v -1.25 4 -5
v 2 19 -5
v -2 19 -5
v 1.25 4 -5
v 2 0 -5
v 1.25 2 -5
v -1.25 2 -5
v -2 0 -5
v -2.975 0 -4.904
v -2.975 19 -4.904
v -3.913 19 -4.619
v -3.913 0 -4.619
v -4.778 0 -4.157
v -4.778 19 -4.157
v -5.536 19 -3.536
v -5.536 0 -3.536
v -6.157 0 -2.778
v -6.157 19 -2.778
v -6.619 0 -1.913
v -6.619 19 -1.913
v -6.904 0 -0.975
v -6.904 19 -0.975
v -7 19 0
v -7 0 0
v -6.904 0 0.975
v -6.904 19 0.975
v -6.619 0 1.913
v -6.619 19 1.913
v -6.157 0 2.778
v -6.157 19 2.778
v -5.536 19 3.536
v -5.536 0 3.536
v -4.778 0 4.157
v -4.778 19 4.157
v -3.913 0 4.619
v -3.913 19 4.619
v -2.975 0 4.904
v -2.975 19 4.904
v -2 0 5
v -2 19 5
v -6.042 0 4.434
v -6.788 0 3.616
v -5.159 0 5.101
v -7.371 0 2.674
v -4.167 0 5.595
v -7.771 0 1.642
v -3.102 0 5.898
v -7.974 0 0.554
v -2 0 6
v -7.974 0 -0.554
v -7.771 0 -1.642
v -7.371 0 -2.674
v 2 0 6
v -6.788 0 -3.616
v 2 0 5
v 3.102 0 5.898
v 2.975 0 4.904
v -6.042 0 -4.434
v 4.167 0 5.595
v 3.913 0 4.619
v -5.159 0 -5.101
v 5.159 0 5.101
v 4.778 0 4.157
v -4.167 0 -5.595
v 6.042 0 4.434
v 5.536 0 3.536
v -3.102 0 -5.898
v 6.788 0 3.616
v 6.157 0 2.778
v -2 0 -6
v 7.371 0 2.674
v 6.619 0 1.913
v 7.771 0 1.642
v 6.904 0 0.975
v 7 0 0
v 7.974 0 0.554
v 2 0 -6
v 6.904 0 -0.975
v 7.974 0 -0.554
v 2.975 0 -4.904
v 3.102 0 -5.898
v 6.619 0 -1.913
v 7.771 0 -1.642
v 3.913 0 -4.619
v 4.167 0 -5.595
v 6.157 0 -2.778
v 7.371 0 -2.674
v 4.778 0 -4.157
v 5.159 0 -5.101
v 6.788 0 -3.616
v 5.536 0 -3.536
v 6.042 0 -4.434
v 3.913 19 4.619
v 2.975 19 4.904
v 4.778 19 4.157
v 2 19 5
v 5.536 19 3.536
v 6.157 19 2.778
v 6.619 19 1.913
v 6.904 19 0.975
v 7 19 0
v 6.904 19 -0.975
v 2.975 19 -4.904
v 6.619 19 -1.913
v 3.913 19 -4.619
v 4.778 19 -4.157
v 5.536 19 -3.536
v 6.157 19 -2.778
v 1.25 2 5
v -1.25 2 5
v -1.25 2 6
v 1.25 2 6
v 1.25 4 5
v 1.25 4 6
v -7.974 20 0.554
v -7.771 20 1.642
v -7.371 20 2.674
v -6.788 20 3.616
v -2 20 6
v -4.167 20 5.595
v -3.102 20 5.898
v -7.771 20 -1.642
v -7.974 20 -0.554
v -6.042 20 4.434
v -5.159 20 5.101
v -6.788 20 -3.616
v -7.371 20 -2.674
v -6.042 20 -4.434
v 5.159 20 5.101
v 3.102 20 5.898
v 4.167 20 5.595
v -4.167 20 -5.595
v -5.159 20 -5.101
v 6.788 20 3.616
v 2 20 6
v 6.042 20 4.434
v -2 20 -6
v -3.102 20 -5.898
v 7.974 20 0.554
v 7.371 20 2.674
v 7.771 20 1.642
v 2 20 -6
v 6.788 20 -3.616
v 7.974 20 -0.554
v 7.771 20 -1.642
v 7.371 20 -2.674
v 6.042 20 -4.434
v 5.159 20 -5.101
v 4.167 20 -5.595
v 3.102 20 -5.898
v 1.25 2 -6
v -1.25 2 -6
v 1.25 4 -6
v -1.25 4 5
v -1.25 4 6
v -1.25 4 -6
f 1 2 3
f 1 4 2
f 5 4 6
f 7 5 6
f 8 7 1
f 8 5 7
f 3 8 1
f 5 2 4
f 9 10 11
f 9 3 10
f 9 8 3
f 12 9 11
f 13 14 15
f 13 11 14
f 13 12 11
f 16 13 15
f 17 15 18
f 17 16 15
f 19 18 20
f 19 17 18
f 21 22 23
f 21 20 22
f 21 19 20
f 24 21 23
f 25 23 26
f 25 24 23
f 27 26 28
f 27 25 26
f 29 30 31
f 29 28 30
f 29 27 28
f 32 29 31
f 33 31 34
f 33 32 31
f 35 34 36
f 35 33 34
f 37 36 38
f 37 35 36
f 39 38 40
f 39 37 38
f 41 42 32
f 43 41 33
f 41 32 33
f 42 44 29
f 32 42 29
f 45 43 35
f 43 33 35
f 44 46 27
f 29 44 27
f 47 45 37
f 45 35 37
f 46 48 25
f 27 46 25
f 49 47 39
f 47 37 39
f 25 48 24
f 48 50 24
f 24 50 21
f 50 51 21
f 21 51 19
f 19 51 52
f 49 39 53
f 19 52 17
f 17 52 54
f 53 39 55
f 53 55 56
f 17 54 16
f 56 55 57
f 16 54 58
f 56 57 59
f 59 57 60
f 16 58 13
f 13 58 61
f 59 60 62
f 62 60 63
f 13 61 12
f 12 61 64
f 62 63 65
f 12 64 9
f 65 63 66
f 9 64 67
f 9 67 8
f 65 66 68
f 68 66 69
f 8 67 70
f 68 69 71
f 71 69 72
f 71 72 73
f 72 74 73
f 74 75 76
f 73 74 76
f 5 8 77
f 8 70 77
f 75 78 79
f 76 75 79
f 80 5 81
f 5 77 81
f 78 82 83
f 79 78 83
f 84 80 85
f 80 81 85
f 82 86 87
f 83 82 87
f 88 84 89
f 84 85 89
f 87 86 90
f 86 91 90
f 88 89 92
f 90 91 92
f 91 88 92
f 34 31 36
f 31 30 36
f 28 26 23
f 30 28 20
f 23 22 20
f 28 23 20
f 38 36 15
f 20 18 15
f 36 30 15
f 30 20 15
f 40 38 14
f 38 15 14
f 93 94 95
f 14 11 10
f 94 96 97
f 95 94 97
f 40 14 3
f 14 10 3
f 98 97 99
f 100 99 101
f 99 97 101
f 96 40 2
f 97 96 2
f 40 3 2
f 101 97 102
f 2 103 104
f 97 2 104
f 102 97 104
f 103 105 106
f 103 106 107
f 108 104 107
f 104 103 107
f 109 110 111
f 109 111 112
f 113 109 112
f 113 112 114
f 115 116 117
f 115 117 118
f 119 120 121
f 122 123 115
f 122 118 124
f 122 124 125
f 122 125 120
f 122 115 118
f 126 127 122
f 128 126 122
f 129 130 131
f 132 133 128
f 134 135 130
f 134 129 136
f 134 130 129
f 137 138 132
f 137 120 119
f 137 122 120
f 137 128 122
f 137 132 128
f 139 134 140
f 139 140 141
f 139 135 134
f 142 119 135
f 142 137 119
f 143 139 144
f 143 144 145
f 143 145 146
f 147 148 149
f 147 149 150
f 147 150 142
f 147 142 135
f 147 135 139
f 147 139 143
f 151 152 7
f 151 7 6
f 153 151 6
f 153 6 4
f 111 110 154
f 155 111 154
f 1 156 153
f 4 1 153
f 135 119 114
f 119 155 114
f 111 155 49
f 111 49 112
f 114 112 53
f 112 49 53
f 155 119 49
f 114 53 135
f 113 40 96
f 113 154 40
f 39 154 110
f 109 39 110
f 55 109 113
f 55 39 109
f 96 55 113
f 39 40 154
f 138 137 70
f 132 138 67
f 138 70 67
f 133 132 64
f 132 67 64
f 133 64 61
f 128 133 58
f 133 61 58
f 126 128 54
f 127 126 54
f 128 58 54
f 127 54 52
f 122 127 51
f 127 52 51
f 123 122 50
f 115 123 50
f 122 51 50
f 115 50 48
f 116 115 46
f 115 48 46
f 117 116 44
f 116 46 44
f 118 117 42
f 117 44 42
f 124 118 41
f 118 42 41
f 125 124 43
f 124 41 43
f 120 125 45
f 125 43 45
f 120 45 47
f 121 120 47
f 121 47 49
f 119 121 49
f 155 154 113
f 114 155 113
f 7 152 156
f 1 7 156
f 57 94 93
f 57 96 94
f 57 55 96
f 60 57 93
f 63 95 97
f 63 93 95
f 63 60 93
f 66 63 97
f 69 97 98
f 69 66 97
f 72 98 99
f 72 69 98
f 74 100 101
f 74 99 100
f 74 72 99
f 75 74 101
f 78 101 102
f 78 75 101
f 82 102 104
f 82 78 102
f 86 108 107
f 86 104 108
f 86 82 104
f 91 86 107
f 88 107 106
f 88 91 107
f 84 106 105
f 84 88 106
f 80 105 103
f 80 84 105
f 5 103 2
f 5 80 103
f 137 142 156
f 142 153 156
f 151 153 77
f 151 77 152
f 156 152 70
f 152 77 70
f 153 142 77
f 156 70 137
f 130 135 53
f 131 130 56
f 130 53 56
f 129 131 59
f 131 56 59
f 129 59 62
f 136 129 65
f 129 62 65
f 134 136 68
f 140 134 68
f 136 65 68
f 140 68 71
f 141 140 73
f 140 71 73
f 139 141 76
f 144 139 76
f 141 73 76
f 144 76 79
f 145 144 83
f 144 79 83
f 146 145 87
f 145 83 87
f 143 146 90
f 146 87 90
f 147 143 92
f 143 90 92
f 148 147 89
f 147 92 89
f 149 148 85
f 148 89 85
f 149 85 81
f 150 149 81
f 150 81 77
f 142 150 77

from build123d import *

# Parameters (mm, degrees)
BOSS_EXTRUDE1_DEPTH     = 20
SHELL1_T                = -1
CUT_EXTRUDE1_DEPTH      = 25.657656012
CUT_EXTRUDE1_DEPTH_BACK = 25.657656012
SKETCH2_W               = 2.5
SKETCH2_H               = 2


with BuildPart() as part:
    # Sketch1 → Boss-Extrude1 (new body)
    with BuildSketch(Plane(origin=(0, 0, 0), x_dir=(1, 0, 0), z_dir=(0, 1, 0))):
        with BuildLine():
            Line((-2, -6), (2, -6))
            ThreePointArc((2, -6), (8, 0), (2, 6))
            Line((2, 6), (-2, 6))
            ThreePointArc((-2, 6), (-8, 0), (-2, -6))
        make_face()
    extrude(amount=BOSS_EXTRUDE1_DEPTH)

    # Shell1
    shell1_openings = [part.faces().sort_by_distance(p)[0] for p in [
        (0, 0, 0),
    ]]
    offset(amount=SHELL1_T, openings=shell1_openings, kind=Kind.INTERSECTION)

    # Sketch2 → Cut-Extrude1 (cut, two sides: drawn at the far end of the back side and taken through both)
    with BuildSketch(Plane.XY.offset(6).offset(-CUT_EXTRUDE1_DEPTH_BACK)):
        with Locations((0, 3)):
            Rectangle(SKETCH2_W, SKETCH2_H)
    extrude(amount=CUT_EXTRUDE1_DEPTH + CUT_EXTRUDE1_DEPTH_BACK, mode=Mode.SUBTRACT)


solid = part.part
